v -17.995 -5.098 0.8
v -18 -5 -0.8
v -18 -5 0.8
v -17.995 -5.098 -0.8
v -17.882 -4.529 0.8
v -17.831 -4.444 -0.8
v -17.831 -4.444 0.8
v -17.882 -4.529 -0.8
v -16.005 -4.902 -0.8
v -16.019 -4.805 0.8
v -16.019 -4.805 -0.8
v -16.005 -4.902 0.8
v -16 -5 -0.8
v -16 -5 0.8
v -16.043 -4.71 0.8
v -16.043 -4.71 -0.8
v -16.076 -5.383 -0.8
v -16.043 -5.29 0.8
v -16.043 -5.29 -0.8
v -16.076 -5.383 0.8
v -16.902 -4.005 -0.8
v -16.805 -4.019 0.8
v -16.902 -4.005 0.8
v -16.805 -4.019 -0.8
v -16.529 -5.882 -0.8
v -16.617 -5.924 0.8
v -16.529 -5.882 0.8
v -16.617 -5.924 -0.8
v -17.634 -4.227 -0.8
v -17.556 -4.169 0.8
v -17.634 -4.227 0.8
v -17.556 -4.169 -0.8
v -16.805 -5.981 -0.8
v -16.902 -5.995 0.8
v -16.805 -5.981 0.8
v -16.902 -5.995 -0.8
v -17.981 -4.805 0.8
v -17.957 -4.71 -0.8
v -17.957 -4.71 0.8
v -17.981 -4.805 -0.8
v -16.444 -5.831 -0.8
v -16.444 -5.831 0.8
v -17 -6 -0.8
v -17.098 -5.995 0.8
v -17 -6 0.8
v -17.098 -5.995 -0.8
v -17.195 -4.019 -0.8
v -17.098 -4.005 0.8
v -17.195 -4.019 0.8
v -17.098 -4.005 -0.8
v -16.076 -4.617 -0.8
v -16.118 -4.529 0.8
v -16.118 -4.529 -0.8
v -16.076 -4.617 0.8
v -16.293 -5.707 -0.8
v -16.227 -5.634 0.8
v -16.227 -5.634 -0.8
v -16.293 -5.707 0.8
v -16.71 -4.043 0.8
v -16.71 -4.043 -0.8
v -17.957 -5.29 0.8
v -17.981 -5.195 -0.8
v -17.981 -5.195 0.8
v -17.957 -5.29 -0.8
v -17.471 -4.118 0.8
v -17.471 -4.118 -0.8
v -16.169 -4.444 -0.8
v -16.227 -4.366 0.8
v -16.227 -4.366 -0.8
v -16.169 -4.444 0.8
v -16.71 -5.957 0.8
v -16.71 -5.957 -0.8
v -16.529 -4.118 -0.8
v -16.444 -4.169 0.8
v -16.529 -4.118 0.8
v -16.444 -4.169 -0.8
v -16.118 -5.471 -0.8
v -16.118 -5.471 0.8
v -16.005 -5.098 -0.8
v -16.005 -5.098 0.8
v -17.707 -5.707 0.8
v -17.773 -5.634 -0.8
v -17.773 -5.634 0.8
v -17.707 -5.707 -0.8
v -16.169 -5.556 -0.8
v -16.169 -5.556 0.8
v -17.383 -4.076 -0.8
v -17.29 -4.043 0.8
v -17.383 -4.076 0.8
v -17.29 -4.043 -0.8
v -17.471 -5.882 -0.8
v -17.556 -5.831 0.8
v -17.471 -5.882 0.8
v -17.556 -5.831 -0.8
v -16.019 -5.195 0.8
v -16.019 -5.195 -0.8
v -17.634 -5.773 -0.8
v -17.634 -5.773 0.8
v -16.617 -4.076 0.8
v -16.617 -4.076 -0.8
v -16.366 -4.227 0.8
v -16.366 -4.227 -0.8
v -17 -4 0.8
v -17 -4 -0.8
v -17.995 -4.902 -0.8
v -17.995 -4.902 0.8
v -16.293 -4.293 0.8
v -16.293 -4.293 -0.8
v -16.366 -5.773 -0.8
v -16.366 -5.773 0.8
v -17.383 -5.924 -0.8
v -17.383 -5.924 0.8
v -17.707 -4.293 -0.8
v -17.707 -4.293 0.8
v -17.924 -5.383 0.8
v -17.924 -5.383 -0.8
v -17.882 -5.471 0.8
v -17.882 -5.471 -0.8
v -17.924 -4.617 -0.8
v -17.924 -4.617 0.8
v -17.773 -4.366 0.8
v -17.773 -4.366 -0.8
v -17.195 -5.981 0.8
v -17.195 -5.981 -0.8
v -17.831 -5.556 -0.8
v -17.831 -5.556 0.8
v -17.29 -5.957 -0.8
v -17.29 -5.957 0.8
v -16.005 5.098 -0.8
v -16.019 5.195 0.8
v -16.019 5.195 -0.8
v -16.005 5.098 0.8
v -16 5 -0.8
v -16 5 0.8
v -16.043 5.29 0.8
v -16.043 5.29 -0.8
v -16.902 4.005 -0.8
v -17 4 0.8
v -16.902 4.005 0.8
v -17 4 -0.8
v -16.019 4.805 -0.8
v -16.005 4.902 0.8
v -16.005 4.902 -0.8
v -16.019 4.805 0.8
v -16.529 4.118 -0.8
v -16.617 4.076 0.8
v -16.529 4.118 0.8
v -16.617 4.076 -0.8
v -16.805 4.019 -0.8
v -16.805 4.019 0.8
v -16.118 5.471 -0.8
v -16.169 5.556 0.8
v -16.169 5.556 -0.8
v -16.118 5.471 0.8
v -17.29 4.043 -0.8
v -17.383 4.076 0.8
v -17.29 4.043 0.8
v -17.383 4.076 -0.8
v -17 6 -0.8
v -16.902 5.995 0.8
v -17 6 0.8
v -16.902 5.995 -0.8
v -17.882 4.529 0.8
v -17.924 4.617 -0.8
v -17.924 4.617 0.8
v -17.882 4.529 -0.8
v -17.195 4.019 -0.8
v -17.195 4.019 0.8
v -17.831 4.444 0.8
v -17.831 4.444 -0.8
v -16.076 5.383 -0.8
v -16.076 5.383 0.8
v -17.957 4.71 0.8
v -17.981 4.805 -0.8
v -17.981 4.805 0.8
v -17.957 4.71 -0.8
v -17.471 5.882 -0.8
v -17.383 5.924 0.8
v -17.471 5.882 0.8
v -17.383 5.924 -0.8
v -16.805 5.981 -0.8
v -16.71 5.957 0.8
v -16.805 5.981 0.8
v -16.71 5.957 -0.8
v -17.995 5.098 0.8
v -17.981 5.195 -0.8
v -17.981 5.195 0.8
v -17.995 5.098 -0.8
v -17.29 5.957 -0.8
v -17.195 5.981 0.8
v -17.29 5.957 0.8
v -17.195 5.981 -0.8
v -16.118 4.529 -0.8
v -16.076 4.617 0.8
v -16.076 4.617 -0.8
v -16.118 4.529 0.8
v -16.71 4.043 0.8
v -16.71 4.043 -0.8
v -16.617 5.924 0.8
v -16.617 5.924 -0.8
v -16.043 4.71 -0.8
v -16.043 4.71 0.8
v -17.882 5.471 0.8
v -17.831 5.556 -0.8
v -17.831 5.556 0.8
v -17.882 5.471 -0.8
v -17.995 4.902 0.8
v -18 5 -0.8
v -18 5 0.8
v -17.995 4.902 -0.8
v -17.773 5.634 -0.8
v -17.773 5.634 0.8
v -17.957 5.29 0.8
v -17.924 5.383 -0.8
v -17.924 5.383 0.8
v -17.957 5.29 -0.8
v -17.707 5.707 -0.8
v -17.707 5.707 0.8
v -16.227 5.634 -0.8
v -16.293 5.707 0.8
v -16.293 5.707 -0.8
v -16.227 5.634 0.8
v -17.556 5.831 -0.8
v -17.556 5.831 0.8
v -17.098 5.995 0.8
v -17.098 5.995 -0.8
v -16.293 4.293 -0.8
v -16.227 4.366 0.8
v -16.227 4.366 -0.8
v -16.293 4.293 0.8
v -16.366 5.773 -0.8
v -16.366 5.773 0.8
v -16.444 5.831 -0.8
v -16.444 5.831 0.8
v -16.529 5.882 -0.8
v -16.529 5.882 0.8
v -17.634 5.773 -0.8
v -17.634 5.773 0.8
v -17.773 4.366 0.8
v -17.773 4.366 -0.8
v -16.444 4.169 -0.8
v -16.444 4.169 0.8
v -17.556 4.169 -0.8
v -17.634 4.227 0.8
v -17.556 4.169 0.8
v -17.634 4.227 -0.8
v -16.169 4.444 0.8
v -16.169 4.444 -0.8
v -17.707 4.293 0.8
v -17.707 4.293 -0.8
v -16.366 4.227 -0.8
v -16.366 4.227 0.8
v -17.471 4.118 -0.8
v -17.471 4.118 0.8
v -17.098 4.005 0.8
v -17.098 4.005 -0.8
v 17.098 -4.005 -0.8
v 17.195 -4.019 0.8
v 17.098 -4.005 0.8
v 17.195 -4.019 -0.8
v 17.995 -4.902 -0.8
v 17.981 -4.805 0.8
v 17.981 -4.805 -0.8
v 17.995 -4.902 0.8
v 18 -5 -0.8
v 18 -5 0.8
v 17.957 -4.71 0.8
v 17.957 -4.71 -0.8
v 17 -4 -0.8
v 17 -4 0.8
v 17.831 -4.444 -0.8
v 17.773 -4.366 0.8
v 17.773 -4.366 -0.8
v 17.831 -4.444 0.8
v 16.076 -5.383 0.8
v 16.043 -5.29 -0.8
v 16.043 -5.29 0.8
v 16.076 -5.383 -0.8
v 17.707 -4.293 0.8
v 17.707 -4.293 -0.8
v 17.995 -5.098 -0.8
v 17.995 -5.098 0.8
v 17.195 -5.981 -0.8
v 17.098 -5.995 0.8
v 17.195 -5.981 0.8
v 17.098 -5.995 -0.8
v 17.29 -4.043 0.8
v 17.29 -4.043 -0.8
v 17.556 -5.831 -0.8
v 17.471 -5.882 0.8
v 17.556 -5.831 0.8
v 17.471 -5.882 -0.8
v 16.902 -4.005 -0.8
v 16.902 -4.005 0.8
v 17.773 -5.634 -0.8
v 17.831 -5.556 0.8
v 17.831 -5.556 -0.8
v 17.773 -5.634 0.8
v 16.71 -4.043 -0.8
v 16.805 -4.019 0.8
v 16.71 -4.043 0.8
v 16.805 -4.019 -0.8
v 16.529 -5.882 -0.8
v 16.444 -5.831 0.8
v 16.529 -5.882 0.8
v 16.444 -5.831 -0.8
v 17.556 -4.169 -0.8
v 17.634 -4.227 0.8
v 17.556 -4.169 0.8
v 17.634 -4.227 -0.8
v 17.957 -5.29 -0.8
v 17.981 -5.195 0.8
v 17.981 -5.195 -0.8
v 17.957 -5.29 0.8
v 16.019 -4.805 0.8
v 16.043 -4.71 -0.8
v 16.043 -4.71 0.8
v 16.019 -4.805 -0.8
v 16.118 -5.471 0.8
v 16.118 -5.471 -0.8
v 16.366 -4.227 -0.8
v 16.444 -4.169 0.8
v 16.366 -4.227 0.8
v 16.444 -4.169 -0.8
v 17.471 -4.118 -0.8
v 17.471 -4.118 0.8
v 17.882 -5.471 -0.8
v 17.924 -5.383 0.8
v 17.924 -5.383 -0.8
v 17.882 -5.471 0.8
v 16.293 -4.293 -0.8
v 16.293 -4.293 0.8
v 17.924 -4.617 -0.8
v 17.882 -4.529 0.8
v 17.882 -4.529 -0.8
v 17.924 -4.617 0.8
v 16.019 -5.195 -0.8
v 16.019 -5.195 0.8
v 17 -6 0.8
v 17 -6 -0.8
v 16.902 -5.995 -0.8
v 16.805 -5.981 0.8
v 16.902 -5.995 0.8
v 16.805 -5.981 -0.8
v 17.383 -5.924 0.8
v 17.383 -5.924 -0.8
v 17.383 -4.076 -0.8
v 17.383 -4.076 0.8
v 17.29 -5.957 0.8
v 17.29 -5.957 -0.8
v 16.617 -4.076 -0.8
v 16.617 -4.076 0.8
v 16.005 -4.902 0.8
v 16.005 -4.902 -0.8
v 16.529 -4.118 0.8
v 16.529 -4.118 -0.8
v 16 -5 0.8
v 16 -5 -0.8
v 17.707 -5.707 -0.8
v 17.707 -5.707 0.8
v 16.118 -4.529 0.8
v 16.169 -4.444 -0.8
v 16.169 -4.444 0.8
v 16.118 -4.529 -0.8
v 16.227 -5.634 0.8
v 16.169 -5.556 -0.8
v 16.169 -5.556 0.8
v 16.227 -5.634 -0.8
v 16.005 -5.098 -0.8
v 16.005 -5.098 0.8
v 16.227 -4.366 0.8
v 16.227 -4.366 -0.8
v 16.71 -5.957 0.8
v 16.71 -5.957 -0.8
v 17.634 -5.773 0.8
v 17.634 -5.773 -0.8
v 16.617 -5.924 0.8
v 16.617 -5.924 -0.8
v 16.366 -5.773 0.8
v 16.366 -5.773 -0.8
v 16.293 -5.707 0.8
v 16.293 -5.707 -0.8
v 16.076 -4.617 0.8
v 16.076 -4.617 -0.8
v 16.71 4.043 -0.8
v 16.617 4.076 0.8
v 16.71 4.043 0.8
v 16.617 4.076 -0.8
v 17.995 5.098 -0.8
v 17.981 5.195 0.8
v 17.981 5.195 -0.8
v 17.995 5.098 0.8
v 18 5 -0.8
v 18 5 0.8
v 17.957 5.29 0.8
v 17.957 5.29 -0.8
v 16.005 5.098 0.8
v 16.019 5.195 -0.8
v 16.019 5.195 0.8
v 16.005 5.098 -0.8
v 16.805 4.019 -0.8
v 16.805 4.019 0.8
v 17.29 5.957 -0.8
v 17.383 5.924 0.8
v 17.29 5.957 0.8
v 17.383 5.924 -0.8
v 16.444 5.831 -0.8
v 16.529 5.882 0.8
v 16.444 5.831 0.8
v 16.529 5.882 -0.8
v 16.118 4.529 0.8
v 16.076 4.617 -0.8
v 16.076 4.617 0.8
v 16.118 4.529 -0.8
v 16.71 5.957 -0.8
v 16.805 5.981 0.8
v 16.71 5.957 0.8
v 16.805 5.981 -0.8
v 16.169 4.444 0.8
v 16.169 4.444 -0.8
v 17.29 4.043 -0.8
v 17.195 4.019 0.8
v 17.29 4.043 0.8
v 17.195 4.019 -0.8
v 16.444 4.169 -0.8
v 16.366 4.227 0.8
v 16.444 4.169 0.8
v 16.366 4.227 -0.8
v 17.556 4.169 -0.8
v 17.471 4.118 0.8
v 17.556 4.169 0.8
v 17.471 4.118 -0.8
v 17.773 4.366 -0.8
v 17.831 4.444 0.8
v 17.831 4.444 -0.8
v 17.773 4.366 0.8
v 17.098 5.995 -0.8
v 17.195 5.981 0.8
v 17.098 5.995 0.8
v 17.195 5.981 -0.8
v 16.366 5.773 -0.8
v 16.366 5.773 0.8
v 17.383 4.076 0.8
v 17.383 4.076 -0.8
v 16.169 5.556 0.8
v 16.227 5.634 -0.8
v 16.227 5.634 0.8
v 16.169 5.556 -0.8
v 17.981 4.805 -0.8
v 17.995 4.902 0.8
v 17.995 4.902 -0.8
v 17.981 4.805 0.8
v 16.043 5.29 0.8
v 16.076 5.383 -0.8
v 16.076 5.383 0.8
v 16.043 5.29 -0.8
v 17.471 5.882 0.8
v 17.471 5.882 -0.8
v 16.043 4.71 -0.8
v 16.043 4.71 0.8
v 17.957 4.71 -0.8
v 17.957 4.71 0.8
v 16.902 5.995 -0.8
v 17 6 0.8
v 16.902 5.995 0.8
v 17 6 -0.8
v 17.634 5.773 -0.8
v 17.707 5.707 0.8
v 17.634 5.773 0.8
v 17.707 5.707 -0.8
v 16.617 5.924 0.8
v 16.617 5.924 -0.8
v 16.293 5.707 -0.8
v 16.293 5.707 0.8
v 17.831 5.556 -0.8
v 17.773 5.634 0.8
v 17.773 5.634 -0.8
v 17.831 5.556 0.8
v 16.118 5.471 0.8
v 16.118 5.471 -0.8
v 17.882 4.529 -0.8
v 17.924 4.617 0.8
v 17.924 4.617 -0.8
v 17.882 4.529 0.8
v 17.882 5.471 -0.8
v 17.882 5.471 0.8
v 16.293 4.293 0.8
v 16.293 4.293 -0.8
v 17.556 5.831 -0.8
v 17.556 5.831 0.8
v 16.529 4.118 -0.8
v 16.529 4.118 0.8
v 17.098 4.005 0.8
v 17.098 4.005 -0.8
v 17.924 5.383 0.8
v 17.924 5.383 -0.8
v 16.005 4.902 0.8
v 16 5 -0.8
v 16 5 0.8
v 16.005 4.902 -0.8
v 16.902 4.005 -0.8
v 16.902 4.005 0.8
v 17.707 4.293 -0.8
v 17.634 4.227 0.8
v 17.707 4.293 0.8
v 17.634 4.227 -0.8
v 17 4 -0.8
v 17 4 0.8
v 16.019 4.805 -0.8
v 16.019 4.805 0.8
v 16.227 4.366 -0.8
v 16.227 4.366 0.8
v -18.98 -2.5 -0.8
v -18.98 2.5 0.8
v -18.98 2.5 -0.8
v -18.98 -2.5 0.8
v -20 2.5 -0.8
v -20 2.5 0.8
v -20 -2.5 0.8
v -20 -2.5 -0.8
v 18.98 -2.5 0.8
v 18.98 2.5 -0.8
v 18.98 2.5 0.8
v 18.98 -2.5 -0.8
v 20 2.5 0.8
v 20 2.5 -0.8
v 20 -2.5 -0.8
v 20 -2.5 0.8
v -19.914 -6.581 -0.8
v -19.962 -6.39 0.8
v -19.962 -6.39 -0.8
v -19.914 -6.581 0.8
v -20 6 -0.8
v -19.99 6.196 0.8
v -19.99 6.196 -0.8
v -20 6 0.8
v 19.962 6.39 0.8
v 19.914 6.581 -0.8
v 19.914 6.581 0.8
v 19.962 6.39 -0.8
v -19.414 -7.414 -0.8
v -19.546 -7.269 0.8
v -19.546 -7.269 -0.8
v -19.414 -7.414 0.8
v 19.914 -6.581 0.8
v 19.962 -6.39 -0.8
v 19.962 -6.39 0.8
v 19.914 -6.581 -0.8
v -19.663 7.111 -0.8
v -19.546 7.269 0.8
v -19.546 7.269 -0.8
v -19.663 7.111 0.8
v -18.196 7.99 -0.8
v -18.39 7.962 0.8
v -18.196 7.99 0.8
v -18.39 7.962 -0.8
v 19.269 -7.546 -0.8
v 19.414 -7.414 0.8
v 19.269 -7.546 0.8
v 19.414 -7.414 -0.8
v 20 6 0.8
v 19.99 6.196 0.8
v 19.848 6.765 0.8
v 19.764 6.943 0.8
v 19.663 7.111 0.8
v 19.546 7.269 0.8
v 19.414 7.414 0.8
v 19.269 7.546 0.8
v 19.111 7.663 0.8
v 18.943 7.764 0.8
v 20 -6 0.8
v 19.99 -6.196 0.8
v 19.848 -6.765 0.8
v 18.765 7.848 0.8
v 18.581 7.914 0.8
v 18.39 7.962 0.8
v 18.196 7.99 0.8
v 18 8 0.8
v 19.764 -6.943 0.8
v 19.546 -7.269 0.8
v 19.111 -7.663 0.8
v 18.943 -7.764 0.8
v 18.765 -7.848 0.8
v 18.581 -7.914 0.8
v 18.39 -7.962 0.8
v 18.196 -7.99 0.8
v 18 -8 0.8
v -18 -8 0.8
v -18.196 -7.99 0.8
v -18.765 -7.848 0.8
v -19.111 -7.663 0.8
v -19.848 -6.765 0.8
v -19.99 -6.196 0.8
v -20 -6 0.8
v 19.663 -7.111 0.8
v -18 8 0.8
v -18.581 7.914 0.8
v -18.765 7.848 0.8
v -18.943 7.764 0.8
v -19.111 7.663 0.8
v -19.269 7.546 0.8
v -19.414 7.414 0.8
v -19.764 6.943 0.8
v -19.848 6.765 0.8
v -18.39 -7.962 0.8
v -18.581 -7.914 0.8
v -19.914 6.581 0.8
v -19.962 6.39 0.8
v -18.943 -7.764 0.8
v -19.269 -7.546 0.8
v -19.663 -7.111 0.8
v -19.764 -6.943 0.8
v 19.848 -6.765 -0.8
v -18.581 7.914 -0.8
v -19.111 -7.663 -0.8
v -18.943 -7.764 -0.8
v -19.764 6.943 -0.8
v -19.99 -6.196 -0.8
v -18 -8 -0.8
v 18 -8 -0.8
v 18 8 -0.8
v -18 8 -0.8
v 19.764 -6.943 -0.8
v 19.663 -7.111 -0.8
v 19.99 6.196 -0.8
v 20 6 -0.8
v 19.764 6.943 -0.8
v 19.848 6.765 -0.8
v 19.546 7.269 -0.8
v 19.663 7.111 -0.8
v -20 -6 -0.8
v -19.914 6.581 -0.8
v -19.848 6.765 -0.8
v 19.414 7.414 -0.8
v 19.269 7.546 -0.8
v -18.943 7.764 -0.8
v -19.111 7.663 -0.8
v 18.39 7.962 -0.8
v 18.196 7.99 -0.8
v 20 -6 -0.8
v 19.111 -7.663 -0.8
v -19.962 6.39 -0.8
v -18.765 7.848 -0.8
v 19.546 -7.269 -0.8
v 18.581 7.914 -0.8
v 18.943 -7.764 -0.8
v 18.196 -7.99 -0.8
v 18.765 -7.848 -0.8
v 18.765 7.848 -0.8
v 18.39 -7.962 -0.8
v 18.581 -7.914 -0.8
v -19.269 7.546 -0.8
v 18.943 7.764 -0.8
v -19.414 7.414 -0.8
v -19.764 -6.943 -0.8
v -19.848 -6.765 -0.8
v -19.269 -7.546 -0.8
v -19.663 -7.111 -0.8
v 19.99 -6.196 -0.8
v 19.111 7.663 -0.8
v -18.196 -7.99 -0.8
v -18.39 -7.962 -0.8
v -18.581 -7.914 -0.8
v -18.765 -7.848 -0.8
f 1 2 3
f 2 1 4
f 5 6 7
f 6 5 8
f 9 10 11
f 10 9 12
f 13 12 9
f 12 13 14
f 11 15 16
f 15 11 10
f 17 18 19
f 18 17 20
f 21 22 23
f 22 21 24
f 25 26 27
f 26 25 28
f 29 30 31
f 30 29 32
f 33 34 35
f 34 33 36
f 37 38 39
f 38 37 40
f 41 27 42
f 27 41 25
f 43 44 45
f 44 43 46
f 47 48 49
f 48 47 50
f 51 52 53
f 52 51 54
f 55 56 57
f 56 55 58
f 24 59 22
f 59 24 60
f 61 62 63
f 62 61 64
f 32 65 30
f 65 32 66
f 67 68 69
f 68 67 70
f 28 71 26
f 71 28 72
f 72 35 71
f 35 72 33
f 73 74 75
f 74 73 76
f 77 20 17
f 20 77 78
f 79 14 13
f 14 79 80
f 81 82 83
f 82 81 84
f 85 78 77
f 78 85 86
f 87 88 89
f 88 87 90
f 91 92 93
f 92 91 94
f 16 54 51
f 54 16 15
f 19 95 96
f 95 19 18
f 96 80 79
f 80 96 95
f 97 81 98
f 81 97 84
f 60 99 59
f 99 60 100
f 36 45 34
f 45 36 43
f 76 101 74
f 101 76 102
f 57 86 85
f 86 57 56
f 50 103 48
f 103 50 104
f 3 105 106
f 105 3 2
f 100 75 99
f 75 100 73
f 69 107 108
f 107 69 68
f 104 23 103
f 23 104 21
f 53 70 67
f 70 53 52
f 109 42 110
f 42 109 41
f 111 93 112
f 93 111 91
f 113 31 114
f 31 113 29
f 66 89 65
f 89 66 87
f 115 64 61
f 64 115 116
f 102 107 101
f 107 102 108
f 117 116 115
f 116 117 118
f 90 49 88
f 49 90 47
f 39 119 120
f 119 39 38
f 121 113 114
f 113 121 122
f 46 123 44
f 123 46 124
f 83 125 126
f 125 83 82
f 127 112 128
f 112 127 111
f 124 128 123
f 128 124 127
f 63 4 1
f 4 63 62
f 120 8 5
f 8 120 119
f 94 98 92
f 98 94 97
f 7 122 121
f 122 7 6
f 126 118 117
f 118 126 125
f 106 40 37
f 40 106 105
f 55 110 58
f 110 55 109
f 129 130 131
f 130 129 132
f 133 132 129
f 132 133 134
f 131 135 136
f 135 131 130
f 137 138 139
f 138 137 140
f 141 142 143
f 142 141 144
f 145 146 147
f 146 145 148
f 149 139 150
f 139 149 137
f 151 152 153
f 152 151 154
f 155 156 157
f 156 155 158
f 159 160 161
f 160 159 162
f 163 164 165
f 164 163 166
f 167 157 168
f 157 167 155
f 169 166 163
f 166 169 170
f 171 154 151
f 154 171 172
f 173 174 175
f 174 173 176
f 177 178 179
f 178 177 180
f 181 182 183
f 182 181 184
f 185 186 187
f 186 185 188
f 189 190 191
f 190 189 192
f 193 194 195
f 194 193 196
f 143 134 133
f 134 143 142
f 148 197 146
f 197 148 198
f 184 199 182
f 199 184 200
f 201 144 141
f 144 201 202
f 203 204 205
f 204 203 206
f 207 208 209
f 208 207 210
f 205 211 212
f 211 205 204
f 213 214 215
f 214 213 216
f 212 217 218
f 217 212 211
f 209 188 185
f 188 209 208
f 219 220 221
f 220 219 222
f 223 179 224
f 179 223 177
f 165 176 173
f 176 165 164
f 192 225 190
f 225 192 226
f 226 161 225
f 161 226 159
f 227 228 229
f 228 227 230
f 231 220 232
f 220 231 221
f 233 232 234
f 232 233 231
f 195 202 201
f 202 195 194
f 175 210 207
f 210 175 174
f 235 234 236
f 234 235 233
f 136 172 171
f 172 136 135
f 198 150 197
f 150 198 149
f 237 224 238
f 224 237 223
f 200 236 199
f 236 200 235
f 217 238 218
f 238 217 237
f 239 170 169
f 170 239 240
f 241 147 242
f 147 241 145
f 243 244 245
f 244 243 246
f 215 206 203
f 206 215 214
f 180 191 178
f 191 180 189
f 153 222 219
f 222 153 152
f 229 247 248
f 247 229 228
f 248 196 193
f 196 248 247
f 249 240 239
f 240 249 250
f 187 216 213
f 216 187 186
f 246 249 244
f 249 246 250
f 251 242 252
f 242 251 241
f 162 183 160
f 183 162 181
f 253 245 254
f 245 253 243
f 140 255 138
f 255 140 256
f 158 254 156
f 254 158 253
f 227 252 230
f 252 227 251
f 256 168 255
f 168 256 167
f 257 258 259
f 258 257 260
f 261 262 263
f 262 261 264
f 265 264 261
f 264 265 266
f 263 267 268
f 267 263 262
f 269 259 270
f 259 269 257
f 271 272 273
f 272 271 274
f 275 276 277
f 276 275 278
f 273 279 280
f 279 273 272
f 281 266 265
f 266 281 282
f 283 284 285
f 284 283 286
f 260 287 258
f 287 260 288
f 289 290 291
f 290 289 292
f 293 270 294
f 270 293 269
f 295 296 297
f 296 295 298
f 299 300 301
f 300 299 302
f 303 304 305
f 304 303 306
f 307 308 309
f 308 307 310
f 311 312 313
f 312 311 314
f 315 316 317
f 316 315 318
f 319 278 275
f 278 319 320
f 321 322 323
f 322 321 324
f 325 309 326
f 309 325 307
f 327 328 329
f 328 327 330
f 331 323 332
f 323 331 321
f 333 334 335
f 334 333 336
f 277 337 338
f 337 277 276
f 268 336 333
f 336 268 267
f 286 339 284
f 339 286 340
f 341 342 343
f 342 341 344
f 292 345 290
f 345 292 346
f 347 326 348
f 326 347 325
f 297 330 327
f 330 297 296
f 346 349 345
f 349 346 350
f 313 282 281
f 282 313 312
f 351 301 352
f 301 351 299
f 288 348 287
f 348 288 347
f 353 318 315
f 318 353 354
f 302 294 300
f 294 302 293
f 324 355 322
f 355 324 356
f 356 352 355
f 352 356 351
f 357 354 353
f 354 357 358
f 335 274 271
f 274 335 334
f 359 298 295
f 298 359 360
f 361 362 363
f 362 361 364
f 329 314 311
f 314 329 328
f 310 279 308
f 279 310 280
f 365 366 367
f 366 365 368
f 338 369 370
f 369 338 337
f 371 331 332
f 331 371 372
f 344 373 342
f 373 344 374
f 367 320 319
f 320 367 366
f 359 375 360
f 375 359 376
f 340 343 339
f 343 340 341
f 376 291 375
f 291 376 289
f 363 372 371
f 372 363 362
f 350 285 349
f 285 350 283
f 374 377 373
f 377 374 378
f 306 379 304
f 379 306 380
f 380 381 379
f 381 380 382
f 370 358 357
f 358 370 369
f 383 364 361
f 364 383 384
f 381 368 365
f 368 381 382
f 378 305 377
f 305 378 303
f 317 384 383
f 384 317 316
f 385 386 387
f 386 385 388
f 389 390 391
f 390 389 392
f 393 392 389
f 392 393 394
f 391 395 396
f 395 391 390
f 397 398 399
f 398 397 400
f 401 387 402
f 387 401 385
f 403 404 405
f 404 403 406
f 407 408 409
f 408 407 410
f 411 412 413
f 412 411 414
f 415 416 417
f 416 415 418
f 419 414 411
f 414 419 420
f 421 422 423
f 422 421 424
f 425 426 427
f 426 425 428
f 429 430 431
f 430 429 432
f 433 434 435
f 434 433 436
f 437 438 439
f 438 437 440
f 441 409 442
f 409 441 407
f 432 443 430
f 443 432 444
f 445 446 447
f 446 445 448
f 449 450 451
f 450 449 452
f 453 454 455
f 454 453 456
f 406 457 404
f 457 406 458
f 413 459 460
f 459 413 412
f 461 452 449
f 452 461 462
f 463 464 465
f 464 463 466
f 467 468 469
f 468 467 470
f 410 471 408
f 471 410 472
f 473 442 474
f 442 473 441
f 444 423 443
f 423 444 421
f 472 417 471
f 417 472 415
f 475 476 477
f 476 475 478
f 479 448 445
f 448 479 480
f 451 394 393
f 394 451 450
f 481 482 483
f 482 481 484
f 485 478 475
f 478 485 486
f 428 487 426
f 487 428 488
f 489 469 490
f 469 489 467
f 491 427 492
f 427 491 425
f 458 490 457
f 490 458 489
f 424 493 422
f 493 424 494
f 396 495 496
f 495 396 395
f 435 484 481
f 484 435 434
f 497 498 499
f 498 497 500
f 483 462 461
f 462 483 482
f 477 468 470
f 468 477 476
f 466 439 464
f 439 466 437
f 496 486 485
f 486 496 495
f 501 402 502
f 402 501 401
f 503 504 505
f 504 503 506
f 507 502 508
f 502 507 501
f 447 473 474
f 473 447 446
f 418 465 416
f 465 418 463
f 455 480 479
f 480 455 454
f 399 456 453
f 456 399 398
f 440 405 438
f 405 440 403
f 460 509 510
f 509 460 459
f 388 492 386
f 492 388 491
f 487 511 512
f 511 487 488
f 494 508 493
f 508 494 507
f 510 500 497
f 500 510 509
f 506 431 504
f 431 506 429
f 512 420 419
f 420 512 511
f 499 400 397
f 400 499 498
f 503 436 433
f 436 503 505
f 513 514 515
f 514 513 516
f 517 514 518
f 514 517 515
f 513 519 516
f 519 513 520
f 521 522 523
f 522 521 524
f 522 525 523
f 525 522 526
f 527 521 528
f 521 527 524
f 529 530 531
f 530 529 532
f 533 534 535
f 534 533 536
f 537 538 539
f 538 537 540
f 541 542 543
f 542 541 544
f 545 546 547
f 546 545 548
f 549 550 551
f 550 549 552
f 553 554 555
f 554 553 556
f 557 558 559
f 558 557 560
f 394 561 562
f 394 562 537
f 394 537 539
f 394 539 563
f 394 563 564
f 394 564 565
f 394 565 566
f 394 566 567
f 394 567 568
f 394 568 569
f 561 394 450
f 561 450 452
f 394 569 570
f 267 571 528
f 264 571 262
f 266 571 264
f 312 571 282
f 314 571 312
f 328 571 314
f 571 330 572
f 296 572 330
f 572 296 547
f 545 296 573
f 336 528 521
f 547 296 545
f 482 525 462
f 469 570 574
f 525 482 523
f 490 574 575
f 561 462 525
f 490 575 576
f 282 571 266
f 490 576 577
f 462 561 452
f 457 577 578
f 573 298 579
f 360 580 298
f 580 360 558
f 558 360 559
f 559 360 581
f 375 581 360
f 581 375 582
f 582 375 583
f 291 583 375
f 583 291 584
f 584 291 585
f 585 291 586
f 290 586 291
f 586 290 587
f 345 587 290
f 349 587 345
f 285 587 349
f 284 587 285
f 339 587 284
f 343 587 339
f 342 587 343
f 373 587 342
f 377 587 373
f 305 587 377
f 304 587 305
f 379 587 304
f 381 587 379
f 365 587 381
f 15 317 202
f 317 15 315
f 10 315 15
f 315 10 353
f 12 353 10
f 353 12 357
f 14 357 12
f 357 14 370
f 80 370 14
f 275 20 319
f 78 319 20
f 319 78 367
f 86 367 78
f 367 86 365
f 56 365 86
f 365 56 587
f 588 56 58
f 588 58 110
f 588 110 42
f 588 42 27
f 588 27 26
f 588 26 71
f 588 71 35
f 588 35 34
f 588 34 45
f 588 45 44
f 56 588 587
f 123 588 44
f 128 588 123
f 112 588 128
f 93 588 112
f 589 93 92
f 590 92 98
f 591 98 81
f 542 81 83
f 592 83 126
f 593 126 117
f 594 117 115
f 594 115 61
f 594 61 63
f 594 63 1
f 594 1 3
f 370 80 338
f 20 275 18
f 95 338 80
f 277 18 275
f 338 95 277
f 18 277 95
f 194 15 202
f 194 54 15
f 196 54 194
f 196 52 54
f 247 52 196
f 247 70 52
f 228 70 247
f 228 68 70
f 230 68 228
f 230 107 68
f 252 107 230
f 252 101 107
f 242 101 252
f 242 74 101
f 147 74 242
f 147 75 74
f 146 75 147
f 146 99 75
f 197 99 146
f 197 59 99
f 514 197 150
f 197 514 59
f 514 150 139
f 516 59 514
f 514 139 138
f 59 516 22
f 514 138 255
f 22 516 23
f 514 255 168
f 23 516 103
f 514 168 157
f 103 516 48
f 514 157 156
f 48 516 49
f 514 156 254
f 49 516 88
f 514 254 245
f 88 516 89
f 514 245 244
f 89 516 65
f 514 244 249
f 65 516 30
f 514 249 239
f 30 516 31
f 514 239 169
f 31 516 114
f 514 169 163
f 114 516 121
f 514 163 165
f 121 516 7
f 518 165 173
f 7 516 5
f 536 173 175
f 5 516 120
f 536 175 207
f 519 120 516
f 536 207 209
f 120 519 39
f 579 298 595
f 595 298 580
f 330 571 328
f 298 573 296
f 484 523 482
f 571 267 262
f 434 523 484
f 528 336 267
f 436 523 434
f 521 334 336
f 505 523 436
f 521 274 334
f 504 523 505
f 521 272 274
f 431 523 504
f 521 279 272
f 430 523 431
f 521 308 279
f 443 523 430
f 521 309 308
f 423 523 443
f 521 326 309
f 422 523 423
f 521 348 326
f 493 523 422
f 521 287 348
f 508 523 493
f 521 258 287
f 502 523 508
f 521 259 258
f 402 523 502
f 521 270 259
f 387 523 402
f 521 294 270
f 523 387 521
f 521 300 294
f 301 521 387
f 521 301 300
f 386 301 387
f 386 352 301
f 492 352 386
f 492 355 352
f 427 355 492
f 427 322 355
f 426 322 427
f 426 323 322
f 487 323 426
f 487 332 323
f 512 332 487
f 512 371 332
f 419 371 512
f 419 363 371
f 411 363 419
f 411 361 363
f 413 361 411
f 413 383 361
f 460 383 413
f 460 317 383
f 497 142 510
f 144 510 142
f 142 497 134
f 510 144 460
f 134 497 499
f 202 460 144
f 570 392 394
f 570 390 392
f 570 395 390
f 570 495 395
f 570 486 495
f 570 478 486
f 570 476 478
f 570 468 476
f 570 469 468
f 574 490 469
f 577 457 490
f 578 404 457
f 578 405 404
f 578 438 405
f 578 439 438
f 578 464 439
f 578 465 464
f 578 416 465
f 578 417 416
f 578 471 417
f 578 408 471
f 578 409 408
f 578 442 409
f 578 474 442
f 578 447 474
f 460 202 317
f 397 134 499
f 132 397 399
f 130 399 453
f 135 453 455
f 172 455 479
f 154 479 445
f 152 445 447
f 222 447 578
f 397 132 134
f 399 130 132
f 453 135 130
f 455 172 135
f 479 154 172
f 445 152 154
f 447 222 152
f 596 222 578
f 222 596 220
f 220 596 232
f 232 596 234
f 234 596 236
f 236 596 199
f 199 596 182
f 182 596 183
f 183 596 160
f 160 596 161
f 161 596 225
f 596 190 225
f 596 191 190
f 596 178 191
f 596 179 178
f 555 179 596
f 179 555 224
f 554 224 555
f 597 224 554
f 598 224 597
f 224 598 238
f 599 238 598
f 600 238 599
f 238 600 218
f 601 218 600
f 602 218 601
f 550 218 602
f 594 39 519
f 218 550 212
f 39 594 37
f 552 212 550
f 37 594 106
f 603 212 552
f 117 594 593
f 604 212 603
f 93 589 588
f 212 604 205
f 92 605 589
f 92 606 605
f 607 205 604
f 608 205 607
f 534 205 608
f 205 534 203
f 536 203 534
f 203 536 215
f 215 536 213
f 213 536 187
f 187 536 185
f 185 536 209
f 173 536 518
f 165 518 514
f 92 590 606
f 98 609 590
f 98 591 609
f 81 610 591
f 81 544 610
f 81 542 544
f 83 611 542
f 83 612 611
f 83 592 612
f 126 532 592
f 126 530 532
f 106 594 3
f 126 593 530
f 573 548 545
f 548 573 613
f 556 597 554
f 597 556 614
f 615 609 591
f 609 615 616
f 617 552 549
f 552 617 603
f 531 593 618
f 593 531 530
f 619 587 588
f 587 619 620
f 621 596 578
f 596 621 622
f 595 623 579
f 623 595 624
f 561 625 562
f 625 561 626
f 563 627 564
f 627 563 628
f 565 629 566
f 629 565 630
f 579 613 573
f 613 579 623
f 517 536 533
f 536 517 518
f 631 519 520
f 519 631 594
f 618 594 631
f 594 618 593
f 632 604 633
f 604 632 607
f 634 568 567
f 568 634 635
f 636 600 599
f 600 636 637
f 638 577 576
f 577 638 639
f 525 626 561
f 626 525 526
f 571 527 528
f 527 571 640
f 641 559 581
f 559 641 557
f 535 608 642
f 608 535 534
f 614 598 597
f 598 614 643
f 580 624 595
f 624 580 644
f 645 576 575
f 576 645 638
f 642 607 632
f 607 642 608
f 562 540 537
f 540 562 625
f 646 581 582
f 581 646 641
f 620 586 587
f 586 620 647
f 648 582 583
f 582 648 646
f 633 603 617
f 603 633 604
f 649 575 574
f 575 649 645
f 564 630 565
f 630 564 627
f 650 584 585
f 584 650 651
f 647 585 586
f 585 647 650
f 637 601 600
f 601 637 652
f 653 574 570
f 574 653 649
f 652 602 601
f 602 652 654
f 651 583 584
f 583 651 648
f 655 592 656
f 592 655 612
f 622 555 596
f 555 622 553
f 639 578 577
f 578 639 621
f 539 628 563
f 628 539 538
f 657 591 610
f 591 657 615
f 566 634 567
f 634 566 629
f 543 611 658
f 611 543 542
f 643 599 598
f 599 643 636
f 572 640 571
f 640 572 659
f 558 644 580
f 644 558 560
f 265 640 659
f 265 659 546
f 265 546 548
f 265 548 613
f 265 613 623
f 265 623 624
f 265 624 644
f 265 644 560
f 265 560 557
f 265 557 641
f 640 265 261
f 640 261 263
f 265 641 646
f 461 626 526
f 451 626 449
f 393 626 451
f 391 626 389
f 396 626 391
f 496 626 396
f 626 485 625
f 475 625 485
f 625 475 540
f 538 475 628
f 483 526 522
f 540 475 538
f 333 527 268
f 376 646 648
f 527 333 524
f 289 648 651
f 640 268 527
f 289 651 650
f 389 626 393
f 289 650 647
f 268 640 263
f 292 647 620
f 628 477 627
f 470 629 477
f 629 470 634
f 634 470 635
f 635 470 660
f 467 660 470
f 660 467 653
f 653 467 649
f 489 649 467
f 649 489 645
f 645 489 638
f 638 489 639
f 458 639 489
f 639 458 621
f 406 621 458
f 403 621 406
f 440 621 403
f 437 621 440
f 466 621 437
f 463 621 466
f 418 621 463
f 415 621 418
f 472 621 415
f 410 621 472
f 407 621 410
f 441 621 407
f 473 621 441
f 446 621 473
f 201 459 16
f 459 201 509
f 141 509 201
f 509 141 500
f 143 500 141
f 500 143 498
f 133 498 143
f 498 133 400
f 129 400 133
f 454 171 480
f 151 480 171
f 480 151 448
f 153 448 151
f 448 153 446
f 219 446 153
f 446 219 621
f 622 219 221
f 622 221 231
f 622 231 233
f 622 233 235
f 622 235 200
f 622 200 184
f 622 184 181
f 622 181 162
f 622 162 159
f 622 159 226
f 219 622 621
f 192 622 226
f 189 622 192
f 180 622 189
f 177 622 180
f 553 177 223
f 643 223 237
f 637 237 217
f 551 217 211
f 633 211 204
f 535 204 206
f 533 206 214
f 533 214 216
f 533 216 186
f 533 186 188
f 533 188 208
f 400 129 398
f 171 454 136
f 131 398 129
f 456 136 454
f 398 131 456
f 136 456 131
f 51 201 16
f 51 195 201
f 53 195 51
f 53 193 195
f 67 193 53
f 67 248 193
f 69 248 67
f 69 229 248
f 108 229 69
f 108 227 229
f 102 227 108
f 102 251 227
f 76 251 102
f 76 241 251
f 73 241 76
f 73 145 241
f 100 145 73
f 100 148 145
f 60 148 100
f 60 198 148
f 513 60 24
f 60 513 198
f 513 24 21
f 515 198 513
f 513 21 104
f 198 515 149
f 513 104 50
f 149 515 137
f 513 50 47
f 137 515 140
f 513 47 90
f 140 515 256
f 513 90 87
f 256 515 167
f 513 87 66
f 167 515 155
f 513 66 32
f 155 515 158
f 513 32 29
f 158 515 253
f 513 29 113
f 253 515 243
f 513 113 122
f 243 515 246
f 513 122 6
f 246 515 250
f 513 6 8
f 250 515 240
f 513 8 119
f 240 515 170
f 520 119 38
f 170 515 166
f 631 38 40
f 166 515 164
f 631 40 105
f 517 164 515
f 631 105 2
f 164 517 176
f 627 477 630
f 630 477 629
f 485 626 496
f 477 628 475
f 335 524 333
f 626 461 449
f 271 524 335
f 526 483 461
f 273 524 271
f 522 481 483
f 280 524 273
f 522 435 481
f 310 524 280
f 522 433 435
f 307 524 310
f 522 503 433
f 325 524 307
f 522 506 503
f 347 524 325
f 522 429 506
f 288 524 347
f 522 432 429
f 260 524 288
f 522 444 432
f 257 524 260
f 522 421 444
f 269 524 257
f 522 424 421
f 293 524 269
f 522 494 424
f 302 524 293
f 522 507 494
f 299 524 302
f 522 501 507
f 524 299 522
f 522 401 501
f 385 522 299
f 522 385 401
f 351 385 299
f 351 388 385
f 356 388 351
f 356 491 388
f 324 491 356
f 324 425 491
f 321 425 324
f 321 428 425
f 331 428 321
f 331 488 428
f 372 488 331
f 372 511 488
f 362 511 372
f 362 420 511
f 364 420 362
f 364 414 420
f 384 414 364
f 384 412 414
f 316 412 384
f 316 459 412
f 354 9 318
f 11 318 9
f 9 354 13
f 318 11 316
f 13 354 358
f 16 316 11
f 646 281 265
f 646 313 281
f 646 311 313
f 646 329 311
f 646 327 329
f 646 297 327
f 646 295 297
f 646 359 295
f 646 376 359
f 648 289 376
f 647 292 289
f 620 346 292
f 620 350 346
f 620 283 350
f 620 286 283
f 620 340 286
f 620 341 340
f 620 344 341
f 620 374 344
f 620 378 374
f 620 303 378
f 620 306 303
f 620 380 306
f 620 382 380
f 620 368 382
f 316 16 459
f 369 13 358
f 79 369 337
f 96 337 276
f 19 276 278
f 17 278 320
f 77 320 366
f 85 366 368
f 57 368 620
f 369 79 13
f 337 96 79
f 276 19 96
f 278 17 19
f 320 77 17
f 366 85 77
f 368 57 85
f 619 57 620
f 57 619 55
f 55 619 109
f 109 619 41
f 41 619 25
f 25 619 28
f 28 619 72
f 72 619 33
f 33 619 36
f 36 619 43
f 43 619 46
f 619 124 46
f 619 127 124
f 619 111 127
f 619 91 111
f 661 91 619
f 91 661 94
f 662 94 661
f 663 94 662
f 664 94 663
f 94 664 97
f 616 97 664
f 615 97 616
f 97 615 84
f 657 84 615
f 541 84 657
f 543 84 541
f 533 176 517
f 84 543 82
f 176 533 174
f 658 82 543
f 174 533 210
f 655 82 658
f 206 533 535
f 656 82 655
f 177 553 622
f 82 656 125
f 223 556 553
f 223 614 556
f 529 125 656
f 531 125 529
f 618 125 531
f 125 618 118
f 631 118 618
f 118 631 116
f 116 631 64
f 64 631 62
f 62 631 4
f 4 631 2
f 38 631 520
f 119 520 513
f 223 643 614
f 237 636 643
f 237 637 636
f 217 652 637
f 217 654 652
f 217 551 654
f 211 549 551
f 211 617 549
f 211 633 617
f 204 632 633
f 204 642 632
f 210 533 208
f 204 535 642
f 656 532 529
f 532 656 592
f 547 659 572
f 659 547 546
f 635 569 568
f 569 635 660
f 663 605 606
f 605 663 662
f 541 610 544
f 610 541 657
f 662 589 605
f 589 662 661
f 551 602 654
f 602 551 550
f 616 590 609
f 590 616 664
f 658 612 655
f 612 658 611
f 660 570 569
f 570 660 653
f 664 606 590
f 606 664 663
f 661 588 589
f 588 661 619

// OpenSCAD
$fn = 64;

// Parameters (mm)
pcb_length = 40.0;
pcb_width  = 16.0;
pcb_thickness = 1.6;

corner_radius = 2.0;

hole_diameter = 2.0;
hole_offset   = 3.0;

connector_cutout_width = 5.0;
connector_cutout_depth = 1.0;

// Small overlap to avoid coincident faces in booleans
eps = 0.02;

// 2D rounded rectangle (centered)
module rounded_rect_2d(L, W, R) {
    // Clamp radius to valid range
    r = min(R, min(L, W)/2);
    hull() {
        for (sx = [-1, 1], sy = [-1, 1])
            translate([sx*(L/2 - r), sy*(W/2 - r)])
                circle(r=r);
    }
}

// Main PCB solid with holes and edge cutouts (ONE connected solid)
module pcb() {
    difference() {
        // PCB body (3D)
        linear_extrude(height=pcb_thickness, center=true, convexity=10)
            rounded_rect_2d(pcb_length, pcb_width, corner_radius);

        // Mounting holes (through)
        for (x = [-pcb_length/2 + hole_offset, pcb_length/2 - hole_offset])
            for (y = [-pcb_width/2 + hole_offset, pcb_width/2 - hole_offset])
                translate([x, y, 0])
                    cylinder(h=pcb_thickness + 2*eps, d=hole_diameter, center=true);

        // Edge connector cutouts (notches) - subtract from left and right edges
        for (sx = [-1, 1]) {
            translate([sx*(pcb_length/2 - connector_cutout_depth/2), 0, 0])
                cube([connector_cutout_depth + 2*eps,
                      connector_cutout_width,
                      pcb_thickness + 2*eps], center=true);
        }
    }
}

pcb();
